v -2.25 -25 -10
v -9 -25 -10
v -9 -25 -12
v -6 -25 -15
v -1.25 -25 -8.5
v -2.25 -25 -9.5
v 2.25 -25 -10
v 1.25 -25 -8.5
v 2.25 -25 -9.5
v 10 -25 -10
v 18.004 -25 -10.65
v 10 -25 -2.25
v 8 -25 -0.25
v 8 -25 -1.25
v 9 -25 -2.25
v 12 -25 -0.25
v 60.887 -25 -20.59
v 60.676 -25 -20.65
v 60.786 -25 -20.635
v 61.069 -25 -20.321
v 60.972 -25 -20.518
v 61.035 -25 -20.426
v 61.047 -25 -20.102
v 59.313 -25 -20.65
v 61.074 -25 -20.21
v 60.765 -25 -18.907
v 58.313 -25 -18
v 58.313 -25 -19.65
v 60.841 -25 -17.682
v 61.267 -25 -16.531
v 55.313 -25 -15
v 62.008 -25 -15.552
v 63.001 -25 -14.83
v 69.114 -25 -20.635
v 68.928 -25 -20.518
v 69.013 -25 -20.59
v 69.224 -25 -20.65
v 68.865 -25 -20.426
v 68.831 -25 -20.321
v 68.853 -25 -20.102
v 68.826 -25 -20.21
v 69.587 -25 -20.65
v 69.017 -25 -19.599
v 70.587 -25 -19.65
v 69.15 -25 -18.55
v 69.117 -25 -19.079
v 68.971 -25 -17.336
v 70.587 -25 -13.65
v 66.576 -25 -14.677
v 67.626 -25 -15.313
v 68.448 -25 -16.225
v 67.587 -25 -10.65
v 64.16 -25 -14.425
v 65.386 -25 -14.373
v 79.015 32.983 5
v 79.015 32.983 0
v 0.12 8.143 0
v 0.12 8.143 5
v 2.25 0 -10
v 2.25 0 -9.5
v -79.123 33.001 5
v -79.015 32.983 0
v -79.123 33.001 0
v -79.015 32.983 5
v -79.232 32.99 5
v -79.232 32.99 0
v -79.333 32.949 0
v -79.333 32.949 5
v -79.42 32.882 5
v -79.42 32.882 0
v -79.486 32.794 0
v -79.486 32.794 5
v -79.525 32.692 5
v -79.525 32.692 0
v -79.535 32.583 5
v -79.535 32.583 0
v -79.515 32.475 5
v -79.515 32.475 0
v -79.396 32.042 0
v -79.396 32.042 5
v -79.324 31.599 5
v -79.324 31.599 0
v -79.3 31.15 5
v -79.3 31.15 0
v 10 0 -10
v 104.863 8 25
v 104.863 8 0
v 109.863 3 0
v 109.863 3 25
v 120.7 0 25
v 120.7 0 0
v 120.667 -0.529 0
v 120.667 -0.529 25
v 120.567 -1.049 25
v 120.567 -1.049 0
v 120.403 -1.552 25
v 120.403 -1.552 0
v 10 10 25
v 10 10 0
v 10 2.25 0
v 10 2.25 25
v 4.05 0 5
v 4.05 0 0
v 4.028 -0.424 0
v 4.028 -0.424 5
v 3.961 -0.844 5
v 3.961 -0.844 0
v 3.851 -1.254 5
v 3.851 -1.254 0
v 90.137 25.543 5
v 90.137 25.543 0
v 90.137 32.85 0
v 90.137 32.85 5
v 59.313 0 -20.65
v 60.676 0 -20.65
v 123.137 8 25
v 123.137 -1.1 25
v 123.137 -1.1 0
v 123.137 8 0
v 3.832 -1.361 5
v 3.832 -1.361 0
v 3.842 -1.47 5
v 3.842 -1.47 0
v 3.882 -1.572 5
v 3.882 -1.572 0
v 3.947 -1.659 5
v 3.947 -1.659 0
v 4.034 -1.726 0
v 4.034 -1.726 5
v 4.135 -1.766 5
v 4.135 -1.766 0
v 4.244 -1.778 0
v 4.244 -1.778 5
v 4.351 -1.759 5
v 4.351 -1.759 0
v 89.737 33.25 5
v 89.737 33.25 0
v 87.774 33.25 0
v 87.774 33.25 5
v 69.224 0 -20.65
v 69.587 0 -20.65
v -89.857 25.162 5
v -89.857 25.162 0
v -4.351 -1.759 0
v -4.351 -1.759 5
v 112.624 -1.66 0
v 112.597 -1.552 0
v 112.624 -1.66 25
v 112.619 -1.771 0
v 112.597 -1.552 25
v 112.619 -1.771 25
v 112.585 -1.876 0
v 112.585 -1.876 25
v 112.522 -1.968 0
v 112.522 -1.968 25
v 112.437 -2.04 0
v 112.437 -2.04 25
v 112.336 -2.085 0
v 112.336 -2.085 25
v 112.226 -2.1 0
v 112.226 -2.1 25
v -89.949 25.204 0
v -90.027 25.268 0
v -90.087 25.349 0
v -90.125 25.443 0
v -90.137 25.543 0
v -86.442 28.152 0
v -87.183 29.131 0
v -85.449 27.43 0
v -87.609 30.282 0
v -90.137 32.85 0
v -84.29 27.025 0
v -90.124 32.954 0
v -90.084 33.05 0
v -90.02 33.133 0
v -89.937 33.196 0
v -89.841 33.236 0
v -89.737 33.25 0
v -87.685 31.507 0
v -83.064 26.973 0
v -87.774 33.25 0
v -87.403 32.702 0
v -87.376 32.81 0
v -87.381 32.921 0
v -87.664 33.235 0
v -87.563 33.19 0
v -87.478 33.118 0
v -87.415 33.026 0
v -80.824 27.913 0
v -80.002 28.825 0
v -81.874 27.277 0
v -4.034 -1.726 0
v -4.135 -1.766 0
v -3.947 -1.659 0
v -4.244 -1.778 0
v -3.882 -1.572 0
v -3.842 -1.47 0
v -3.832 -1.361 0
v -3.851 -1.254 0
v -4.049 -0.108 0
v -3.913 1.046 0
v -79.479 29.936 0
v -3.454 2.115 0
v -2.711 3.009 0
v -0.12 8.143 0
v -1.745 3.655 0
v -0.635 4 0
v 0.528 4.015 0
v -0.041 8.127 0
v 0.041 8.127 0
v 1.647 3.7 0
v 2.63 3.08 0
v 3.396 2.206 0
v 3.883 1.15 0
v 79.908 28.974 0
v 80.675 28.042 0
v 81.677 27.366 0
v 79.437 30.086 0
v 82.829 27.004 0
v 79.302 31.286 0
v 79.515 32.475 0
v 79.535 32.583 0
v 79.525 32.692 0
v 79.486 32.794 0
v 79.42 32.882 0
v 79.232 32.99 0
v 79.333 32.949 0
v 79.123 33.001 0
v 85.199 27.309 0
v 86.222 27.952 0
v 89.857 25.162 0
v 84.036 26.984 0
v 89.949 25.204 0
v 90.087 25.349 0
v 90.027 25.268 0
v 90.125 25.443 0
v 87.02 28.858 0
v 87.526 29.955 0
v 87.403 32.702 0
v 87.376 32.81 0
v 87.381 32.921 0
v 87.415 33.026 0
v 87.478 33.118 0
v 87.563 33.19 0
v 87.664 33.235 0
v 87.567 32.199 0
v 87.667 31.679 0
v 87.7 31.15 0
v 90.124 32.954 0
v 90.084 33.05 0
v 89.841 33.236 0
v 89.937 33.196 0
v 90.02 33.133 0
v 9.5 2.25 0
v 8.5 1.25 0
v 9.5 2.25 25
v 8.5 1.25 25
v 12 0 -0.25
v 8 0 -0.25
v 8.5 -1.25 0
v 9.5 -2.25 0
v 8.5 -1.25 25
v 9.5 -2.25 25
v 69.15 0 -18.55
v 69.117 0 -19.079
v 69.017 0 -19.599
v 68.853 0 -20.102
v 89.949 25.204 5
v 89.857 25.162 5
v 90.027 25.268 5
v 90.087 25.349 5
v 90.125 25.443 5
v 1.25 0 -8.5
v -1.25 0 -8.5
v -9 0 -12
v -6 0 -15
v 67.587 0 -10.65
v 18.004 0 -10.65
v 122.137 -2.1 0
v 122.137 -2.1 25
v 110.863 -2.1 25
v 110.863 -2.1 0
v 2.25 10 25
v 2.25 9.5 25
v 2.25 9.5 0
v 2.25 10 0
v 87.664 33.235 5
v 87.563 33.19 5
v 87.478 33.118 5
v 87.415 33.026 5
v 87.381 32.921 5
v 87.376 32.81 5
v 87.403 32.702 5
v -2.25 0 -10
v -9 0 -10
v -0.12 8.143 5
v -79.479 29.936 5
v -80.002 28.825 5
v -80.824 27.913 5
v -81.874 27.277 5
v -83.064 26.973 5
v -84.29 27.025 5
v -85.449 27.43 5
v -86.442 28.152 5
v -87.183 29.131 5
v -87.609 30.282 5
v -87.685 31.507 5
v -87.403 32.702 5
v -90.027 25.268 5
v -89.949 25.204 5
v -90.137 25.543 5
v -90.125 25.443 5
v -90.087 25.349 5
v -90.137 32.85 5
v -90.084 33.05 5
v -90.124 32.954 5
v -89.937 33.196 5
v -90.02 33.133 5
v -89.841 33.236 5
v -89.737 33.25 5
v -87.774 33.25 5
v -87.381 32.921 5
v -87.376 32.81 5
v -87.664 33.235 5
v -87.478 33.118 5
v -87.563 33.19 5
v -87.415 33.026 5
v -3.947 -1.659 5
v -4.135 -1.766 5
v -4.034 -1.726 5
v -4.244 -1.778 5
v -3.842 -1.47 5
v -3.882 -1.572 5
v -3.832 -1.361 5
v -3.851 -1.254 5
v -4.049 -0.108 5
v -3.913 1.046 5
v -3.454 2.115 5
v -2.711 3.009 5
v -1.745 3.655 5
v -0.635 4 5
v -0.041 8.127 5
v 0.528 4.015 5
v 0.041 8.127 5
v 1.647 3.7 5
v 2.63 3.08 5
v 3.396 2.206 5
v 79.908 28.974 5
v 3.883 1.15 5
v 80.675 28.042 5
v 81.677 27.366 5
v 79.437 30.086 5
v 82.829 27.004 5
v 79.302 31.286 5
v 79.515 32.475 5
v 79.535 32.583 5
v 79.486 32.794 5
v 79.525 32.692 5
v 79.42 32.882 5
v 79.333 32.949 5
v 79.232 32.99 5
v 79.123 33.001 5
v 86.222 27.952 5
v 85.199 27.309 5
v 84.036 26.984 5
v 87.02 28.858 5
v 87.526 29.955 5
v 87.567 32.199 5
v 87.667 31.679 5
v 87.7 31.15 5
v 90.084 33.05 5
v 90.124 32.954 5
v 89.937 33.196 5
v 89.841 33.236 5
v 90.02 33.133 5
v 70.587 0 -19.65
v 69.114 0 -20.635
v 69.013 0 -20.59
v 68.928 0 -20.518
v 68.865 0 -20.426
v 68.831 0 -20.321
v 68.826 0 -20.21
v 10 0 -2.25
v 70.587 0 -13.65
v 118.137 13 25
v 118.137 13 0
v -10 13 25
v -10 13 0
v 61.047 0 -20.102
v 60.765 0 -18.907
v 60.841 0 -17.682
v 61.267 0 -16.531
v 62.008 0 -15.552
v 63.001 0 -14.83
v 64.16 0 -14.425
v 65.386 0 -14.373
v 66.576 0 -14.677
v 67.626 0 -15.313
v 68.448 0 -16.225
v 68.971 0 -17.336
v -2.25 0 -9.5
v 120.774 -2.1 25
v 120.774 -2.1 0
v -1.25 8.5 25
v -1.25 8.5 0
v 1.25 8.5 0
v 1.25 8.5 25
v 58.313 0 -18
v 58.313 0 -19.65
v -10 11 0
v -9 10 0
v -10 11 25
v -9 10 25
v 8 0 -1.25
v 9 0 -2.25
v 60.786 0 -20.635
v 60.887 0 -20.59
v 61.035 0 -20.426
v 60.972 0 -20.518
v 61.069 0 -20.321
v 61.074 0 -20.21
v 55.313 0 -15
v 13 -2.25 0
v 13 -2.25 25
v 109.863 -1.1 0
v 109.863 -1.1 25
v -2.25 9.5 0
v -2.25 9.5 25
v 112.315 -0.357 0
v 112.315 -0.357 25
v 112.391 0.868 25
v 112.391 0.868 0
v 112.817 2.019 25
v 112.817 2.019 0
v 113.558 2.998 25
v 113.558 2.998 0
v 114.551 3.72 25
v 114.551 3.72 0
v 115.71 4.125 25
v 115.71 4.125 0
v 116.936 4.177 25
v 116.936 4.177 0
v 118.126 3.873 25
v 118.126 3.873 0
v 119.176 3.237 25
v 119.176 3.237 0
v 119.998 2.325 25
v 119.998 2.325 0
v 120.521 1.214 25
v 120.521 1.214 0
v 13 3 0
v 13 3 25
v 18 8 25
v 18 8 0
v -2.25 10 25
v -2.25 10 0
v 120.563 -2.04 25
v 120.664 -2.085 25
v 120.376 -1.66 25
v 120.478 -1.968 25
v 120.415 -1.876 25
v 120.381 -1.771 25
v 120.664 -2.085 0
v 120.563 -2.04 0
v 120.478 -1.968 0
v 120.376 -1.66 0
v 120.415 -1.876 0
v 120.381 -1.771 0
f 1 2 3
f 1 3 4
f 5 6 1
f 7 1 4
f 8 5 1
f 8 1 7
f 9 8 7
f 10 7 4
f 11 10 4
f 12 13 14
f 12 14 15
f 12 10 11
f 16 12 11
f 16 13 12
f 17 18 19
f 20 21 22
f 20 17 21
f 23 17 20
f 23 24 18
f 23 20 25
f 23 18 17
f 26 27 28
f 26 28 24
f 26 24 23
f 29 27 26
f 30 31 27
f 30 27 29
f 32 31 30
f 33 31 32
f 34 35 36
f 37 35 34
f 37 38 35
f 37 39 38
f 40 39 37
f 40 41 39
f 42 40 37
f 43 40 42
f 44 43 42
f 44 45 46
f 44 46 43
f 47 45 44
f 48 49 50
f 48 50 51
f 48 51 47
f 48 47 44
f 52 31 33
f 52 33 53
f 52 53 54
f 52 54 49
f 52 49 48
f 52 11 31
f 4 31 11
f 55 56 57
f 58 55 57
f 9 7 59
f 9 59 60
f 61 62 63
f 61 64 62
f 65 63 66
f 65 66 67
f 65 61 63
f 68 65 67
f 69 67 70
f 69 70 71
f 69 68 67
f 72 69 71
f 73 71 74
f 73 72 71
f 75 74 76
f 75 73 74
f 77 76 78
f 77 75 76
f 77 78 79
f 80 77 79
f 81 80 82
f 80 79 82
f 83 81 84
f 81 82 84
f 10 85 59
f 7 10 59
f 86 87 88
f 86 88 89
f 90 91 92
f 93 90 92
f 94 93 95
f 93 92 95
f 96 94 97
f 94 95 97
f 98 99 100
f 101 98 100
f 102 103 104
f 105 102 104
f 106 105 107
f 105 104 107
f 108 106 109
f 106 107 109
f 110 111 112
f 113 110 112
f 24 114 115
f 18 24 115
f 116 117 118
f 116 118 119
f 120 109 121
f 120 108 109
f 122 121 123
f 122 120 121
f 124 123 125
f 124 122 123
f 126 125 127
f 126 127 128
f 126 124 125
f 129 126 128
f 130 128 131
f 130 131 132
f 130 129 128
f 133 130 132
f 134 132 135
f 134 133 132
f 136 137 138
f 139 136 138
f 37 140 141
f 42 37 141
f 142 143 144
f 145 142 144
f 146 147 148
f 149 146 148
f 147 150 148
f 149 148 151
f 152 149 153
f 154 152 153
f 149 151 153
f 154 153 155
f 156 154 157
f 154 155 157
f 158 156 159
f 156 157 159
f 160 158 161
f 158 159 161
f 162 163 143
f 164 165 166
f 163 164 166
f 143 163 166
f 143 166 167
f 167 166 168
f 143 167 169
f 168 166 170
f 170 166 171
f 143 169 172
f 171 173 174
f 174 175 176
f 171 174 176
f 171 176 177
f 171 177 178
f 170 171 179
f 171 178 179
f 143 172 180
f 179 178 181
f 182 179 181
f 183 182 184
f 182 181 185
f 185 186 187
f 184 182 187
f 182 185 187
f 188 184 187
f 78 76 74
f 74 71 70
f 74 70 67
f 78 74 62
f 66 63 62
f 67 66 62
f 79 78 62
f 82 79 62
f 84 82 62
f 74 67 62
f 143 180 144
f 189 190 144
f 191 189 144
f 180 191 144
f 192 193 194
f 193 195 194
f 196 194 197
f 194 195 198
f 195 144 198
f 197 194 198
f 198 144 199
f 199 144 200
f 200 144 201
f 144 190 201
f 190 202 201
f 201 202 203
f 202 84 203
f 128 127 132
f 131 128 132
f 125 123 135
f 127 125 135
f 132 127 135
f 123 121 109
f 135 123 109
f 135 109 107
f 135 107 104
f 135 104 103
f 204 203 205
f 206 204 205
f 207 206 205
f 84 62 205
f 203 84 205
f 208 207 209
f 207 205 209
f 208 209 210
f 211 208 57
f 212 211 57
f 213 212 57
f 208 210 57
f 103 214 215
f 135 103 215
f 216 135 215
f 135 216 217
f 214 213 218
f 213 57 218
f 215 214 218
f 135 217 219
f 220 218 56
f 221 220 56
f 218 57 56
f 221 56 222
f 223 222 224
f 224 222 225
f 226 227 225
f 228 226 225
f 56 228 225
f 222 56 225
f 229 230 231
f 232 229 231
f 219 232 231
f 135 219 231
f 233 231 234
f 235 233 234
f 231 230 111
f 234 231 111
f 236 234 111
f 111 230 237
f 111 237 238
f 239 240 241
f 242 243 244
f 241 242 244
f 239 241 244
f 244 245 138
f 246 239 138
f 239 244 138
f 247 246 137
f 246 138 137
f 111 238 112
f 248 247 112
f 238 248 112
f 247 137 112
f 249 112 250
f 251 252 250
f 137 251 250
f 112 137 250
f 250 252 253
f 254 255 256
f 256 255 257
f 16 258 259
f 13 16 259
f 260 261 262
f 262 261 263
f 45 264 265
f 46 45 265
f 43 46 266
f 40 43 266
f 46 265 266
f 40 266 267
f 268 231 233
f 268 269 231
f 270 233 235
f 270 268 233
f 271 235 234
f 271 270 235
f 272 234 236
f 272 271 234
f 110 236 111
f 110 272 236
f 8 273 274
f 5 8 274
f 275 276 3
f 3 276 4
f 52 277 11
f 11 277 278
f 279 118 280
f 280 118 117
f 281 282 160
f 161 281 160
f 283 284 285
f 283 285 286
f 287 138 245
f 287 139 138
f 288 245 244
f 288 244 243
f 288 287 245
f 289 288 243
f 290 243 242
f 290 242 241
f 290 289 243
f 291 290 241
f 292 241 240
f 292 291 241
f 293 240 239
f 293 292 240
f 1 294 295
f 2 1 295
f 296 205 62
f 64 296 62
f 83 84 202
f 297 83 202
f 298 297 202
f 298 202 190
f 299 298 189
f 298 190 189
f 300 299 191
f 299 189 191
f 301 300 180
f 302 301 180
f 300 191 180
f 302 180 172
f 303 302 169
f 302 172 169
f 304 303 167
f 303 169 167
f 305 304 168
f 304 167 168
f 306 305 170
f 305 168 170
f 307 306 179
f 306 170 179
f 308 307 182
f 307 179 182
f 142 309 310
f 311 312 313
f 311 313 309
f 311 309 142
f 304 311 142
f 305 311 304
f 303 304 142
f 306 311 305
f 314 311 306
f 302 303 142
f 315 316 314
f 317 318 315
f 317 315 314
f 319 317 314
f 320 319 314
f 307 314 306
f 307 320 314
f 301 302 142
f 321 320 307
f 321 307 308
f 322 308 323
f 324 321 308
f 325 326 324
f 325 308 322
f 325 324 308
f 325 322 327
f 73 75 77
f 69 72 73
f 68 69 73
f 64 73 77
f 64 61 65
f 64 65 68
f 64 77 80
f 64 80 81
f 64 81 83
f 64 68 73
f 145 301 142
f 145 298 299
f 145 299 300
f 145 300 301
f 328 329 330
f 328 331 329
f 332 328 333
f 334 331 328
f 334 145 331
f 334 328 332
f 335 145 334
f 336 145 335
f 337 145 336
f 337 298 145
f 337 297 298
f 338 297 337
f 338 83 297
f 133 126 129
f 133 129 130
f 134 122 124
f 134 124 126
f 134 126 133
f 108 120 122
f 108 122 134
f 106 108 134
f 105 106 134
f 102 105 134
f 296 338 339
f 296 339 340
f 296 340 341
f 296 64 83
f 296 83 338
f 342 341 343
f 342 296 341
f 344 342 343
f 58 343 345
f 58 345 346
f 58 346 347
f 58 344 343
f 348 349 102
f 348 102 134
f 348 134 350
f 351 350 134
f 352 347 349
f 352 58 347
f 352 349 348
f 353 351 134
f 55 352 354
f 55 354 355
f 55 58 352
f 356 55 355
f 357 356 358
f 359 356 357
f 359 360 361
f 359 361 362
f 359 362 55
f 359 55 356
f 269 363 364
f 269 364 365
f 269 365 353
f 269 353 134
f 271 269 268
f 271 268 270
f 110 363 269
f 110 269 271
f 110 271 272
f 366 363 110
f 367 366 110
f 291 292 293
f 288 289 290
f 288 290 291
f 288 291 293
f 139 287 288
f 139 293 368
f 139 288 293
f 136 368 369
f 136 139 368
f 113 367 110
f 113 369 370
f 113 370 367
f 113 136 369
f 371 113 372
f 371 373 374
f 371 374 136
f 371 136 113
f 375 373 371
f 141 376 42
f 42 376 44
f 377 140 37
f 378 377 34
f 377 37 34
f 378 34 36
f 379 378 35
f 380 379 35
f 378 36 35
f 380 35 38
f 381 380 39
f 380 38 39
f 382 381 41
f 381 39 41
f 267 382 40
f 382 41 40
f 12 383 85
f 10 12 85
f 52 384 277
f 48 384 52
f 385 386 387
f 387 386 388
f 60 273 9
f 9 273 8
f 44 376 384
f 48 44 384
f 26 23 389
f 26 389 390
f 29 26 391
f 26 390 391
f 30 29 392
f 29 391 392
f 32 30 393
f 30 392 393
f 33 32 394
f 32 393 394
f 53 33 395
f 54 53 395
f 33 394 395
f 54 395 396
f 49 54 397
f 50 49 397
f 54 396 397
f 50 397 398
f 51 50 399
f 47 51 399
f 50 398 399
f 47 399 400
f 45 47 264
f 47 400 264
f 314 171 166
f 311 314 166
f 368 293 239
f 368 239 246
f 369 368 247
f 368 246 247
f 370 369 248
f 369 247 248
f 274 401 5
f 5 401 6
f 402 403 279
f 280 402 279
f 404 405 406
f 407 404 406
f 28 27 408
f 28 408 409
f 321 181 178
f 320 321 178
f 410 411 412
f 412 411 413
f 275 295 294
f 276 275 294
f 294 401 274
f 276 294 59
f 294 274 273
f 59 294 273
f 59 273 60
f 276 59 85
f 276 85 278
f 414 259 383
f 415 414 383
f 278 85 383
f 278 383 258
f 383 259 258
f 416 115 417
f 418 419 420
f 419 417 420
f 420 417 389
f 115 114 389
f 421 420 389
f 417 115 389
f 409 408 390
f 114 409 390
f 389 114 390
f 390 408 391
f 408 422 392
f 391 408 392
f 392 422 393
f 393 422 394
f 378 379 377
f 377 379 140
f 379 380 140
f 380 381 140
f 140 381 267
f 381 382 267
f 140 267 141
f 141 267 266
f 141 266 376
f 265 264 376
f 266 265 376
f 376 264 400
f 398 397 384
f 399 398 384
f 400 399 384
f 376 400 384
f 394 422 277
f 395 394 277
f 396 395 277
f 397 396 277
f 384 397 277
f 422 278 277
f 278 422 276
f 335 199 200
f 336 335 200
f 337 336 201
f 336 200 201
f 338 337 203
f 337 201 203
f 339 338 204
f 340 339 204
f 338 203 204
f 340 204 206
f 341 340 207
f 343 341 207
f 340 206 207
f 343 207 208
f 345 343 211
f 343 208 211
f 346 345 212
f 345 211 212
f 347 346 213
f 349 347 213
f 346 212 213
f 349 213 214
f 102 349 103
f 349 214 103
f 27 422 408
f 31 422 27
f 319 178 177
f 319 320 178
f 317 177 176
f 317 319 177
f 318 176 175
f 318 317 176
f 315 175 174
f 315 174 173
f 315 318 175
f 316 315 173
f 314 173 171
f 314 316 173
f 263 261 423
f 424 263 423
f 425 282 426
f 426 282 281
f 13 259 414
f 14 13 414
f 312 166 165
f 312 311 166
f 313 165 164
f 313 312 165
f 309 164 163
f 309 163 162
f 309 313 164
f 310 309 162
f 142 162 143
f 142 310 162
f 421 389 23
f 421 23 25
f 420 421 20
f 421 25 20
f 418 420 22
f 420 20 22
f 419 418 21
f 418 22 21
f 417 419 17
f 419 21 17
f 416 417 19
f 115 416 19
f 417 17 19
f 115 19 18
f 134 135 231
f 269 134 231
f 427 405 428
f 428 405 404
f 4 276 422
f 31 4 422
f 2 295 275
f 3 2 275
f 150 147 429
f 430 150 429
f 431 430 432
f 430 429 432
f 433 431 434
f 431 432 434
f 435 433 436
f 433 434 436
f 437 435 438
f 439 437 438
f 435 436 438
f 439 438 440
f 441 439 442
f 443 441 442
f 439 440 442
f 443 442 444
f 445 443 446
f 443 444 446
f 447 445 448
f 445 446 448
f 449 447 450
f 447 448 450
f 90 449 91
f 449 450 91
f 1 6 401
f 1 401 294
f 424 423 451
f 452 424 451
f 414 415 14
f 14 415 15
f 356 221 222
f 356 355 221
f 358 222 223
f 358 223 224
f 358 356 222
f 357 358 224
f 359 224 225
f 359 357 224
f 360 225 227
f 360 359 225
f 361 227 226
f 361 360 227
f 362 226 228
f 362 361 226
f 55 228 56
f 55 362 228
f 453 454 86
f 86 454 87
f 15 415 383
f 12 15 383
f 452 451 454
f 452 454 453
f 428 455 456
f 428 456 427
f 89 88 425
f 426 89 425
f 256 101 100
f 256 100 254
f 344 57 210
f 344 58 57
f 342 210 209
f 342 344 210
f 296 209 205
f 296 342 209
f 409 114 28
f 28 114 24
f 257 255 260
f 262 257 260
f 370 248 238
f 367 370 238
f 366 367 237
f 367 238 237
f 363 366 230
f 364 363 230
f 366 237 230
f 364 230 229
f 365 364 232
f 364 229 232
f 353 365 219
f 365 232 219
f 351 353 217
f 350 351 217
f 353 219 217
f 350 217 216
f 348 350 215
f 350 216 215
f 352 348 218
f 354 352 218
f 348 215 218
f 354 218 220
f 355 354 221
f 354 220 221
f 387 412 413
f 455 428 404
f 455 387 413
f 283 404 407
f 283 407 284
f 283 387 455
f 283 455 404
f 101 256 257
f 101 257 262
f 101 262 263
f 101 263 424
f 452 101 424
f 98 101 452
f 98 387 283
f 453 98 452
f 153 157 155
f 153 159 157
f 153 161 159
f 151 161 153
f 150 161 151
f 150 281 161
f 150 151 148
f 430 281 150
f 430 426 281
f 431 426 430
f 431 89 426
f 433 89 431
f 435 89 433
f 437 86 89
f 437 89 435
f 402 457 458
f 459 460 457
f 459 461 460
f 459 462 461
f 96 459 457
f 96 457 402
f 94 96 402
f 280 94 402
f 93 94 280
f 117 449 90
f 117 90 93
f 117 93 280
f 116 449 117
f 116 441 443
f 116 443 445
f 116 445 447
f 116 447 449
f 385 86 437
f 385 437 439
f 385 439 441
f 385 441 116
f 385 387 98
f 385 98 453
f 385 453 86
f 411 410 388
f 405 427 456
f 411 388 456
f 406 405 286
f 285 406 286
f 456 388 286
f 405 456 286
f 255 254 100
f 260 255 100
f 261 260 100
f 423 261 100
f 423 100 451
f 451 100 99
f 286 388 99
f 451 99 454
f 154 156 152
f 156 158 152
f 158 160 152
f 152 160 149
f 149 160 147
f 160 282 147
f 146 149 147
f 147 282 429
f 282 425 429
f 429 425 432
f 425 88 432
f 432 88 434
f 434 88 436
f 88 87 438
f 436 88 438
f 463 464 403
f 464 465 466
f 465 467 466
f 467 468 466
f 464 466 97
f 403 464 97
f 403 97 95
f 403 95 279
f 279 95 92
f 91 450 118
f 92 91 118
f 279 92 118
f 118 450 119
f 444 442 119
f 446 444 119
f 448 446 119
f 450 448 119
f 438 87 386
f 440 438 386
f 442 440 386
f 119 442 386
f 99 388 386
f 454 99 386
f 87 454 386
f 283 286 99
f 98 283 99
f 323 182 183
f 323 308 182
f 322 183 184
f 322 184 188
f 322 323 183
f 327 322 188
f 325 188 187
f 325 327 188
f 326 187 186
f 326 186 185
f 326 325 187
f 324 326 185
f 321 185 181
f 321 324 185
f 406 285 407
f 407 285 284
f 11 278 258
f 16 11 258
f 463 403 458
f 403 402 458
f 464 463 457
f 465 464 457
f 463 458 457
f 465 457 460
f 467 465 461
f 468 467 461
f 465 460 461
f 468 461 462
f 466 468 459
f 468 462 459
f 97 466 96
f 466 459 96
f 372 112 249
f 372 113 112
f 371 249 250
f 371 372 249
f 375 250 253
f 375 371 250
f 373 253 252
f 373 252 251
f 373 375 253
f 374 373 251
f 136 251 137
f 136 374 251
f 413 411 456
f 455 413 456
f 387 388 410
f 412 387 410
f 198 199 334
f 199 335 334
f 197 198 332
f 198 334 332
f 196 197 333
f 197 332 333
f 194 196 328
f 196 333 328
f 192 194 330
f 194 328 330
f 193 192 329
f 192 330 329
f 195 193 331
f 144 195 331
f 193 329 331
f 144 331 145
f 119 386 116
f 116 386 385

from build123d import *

# Parameters (mm, degrees)
F2_DEPTH  = 25
F3_SIZE   = 1
F4_SIZE   = 3
F6_DEPTH  = 25
F7_SIZE   = 1
F8_SIZE   = 5
F9_R      = 0.4
F9_2_R    = 0.4
F11_DEPTH = 5
F12_R     = 0.4


with BuildPart() as f2:
    # F1 (on Front) → F2 (new body)
    with BuildSketch(Plane.XZ):
        with BuildLine():
            Line((8, -0.25), (8, -2.25))
            Line((8, -2.25), (10, -2.25))
            Line((10, -2.25), (10, -10))
            Line((10, -10), (2.25, -10))
            Line((2.25, -10), (2.25, -8.5))
            Line((2.25, -8.5), (-2.25, -8.5))
            Line((-2.25, -8.5), (-2.25, -10))
            Line((-2.25, -10), (-9, -10))
            Line((-9, -10), (-9, -15))
            Line((-9, -15), (58.312693, -15))
            Line((58.312693, -15), (58.312693, -20.65))
            Line((58.312693, -20.65), (61.312693, -20.65))
            ThreePointArc((61.312693, -20.65), (63.86296, -14.493112), (69.15, -18.55))
            ThreePointArc((69.15, -18.55), (69.006888, -19.63704), (68.587307, -20.65))
            Line((68.587307, -20.65), (70.587307, -20.65))
            Line((70.587307, -20.65), (70.587307, -10.65))
            Line((70.587307, -10.65), (18.004443, -10.65))
            Line((18.004443, -10.65), (12, -0.25))
            Line((12, -0.25), (8, -0.25))
        make_face()
    extrude(amount=F2_DEPTH)

    # F3
    f3_edges = [f2.edges().sort_by_distance(p)[0] for p in [
        (-2.25, -12.5, -8.5),
        (2.25, -12.5, -8.5),
        (8, -12.5, -2.25),
        (58.312693, -12.5, -20.65),
        (70.587307, -12.5, -20.65),
    ]]
    chamfer(f3_edges, length=F3_SIZE)

    # F4
    f4_edges = [f2.edges().sort_by_distance(p)[0] for p in [
        (-9, -12.5, -15),
        (58.312693, -12.5, -15),
        (70.587307, -12.5, -10.65),
    ]]
    chamfer(f4_edges, length=F4_SIZE)

    # F9
    f9_edges = [f2.edges().sort_by_distance(p)[0] for p in [
        (61.312693, -12.5, -20.65),
        (68.587307, -12.5, -20.65),
    ]]
    fillet(f9_edges, radius=F9_R)


with BuildPart() as f6:
    # F5 (on Top) → F6 (new body)
    with BuildSketch(Plane.XY):
        with BuildLine():
            ThreePointArc((112.862693, -2.1), (115.41296, 4.056888), (120.7, 0))
            ThreePointArc((120.7, 0), (120.556888, -1.08704), (120.137307, -2.1))
            Line((120.137307, -2.1), (123.137307, -2.1))
            Line((123.137307, -2.1), (123.137307, 13))
            Line((123.137307, 13), (-10, 13))
            Line((-10, 13), (-10, 10))
            Line((-10, 10), (-2.25, 10))
            Line((-2.25, 10), (-2.25, 8.5))
            Line((-2.25, 8.5), (2.25, 8.5))
            Line((2.25, 8.5), (2.25, 10))
            Line((2.25, 10), (10, 10))
            Line((10, 10), (10, 2.25))
            Line((10, 2.25), (8.5, 2.25))
            Line((8.5, 2.25), (8.5, -2.25))
            Line((8.5, -2.25), (10, -2.25))
            Line((10, -2.25), (13, -2.25))
            Line((13, -2.25), (13, 8))
            Line((13, 8), (109.862693, 8))
            Line((109.862693, 8), (109.862693, -2.1))
            Line((109.862693, -2.1), (112.862693, -2.1))
        make_face()
    extrude(amount=F6_DEPTH)

    # F7
    f7_edges = [f6.edges().sort_by_distance(p)[0] for p in [
        (8.5, 2.25, 12.5),
        (8.5, -2.25, 12.5),
        (-2.25, 8.5, 12.5),
        (2.25, 8.5, 12.5),
        (-10, 10, 12.5),
        (109.862693, -2.1, 12.5),
        (123.137307, -2.1, 12.5),
    ]]
    chamfer(f7_edges, length=F7_SIZE)

    # F8
    f8_edges = [f6.edges().sort_by_distance(p)[0] for p in [
        (123.137307, 13, 12.5),
        (109.862693, 8, 12.5),
        (13, 8, 12.5),
    ]]
    chamfer(f8_edges, length=F8_SIZE)

    # F9#2
    f9_2_edges = [f6.edges().sort_by_distance(p)[0] for p in [
        (112.862693, -2.1, 12.5),
        (120.137307, -2.1, 12.5),
    ]]
    fillet(f9_2_edges, radius=F9_2_R)


with BuildPart() as f11:
    # F10 (on Top) → F11 (new body)
    with BuildSketch(Plane.XY):
        with BuildLine():
            ThreePointArc((-3.507403, -2.025), (-1.048217, 3.912), (4.05, 0))
            ThreePointArc((4.05, 0), (3.912, -1.048217), (3.507403, -2.025))
            Line((3.507403, -2.025), (90.137307, 25.25))
            Line((90.137307, 25.25), (90.137307, 33.25))
            Line((90.137307, 33.25), (87.137307, 33.25))
            ThreePointArc((87.137307, 33.25), (87.556888, 32.23704), (87.7, 31.15))
            ThreePointArc((87.7, 31.15), (82.41296, 27.093112), (79.862693, 33.25))
            Line((79.862693, 33.25), (0, 8.105623))
            Line((0, 8.105623), (-79.862693, 33.25))
            ThreePointArc((-79.862693, 33.25), (-79.443112, 32.23704), (-79.3, 31.15))
            ThreePointArc((-79.3, 31.15), (-84.58704, 27.093112), (-87.137307, 33.25))
            Line((-87.137307, 33.25), (-90.137307, 33.25))
            Line((-90.137307, 33.25), (-90.137307, 25.25))
            Line((-90.137307, 25.25), (-3.507403, -2.025))
        make_face()
    extrude(amount=F11_DEPTH)

    # F12
    f12_edges = [f11.edges().sort_by_distance(p)[0] for p in [
        (-3.507403, -2.025, 2.5),
        (3.507403, -2.025, 2.5),
        (0, 8.105623, 2.5),
        (79.862693, 33.25, 2.5),
        (87.137307, 33.25, 2.5),
        (90.137307, 33.25, 2.5),
        (90.137307, 25.25, 2.5),
        (-90.137307, 33.25, 2.5),
        (-90.137307, 25.25, 2.5),
        (-79.862693, 33.25, 2.5),
        (-87.137307, 33.25, 2.5),
    ]]
    fillet(f12_edges, radius=F12_R)


solid = Compound([f2.part, f6.part, f11.part])
